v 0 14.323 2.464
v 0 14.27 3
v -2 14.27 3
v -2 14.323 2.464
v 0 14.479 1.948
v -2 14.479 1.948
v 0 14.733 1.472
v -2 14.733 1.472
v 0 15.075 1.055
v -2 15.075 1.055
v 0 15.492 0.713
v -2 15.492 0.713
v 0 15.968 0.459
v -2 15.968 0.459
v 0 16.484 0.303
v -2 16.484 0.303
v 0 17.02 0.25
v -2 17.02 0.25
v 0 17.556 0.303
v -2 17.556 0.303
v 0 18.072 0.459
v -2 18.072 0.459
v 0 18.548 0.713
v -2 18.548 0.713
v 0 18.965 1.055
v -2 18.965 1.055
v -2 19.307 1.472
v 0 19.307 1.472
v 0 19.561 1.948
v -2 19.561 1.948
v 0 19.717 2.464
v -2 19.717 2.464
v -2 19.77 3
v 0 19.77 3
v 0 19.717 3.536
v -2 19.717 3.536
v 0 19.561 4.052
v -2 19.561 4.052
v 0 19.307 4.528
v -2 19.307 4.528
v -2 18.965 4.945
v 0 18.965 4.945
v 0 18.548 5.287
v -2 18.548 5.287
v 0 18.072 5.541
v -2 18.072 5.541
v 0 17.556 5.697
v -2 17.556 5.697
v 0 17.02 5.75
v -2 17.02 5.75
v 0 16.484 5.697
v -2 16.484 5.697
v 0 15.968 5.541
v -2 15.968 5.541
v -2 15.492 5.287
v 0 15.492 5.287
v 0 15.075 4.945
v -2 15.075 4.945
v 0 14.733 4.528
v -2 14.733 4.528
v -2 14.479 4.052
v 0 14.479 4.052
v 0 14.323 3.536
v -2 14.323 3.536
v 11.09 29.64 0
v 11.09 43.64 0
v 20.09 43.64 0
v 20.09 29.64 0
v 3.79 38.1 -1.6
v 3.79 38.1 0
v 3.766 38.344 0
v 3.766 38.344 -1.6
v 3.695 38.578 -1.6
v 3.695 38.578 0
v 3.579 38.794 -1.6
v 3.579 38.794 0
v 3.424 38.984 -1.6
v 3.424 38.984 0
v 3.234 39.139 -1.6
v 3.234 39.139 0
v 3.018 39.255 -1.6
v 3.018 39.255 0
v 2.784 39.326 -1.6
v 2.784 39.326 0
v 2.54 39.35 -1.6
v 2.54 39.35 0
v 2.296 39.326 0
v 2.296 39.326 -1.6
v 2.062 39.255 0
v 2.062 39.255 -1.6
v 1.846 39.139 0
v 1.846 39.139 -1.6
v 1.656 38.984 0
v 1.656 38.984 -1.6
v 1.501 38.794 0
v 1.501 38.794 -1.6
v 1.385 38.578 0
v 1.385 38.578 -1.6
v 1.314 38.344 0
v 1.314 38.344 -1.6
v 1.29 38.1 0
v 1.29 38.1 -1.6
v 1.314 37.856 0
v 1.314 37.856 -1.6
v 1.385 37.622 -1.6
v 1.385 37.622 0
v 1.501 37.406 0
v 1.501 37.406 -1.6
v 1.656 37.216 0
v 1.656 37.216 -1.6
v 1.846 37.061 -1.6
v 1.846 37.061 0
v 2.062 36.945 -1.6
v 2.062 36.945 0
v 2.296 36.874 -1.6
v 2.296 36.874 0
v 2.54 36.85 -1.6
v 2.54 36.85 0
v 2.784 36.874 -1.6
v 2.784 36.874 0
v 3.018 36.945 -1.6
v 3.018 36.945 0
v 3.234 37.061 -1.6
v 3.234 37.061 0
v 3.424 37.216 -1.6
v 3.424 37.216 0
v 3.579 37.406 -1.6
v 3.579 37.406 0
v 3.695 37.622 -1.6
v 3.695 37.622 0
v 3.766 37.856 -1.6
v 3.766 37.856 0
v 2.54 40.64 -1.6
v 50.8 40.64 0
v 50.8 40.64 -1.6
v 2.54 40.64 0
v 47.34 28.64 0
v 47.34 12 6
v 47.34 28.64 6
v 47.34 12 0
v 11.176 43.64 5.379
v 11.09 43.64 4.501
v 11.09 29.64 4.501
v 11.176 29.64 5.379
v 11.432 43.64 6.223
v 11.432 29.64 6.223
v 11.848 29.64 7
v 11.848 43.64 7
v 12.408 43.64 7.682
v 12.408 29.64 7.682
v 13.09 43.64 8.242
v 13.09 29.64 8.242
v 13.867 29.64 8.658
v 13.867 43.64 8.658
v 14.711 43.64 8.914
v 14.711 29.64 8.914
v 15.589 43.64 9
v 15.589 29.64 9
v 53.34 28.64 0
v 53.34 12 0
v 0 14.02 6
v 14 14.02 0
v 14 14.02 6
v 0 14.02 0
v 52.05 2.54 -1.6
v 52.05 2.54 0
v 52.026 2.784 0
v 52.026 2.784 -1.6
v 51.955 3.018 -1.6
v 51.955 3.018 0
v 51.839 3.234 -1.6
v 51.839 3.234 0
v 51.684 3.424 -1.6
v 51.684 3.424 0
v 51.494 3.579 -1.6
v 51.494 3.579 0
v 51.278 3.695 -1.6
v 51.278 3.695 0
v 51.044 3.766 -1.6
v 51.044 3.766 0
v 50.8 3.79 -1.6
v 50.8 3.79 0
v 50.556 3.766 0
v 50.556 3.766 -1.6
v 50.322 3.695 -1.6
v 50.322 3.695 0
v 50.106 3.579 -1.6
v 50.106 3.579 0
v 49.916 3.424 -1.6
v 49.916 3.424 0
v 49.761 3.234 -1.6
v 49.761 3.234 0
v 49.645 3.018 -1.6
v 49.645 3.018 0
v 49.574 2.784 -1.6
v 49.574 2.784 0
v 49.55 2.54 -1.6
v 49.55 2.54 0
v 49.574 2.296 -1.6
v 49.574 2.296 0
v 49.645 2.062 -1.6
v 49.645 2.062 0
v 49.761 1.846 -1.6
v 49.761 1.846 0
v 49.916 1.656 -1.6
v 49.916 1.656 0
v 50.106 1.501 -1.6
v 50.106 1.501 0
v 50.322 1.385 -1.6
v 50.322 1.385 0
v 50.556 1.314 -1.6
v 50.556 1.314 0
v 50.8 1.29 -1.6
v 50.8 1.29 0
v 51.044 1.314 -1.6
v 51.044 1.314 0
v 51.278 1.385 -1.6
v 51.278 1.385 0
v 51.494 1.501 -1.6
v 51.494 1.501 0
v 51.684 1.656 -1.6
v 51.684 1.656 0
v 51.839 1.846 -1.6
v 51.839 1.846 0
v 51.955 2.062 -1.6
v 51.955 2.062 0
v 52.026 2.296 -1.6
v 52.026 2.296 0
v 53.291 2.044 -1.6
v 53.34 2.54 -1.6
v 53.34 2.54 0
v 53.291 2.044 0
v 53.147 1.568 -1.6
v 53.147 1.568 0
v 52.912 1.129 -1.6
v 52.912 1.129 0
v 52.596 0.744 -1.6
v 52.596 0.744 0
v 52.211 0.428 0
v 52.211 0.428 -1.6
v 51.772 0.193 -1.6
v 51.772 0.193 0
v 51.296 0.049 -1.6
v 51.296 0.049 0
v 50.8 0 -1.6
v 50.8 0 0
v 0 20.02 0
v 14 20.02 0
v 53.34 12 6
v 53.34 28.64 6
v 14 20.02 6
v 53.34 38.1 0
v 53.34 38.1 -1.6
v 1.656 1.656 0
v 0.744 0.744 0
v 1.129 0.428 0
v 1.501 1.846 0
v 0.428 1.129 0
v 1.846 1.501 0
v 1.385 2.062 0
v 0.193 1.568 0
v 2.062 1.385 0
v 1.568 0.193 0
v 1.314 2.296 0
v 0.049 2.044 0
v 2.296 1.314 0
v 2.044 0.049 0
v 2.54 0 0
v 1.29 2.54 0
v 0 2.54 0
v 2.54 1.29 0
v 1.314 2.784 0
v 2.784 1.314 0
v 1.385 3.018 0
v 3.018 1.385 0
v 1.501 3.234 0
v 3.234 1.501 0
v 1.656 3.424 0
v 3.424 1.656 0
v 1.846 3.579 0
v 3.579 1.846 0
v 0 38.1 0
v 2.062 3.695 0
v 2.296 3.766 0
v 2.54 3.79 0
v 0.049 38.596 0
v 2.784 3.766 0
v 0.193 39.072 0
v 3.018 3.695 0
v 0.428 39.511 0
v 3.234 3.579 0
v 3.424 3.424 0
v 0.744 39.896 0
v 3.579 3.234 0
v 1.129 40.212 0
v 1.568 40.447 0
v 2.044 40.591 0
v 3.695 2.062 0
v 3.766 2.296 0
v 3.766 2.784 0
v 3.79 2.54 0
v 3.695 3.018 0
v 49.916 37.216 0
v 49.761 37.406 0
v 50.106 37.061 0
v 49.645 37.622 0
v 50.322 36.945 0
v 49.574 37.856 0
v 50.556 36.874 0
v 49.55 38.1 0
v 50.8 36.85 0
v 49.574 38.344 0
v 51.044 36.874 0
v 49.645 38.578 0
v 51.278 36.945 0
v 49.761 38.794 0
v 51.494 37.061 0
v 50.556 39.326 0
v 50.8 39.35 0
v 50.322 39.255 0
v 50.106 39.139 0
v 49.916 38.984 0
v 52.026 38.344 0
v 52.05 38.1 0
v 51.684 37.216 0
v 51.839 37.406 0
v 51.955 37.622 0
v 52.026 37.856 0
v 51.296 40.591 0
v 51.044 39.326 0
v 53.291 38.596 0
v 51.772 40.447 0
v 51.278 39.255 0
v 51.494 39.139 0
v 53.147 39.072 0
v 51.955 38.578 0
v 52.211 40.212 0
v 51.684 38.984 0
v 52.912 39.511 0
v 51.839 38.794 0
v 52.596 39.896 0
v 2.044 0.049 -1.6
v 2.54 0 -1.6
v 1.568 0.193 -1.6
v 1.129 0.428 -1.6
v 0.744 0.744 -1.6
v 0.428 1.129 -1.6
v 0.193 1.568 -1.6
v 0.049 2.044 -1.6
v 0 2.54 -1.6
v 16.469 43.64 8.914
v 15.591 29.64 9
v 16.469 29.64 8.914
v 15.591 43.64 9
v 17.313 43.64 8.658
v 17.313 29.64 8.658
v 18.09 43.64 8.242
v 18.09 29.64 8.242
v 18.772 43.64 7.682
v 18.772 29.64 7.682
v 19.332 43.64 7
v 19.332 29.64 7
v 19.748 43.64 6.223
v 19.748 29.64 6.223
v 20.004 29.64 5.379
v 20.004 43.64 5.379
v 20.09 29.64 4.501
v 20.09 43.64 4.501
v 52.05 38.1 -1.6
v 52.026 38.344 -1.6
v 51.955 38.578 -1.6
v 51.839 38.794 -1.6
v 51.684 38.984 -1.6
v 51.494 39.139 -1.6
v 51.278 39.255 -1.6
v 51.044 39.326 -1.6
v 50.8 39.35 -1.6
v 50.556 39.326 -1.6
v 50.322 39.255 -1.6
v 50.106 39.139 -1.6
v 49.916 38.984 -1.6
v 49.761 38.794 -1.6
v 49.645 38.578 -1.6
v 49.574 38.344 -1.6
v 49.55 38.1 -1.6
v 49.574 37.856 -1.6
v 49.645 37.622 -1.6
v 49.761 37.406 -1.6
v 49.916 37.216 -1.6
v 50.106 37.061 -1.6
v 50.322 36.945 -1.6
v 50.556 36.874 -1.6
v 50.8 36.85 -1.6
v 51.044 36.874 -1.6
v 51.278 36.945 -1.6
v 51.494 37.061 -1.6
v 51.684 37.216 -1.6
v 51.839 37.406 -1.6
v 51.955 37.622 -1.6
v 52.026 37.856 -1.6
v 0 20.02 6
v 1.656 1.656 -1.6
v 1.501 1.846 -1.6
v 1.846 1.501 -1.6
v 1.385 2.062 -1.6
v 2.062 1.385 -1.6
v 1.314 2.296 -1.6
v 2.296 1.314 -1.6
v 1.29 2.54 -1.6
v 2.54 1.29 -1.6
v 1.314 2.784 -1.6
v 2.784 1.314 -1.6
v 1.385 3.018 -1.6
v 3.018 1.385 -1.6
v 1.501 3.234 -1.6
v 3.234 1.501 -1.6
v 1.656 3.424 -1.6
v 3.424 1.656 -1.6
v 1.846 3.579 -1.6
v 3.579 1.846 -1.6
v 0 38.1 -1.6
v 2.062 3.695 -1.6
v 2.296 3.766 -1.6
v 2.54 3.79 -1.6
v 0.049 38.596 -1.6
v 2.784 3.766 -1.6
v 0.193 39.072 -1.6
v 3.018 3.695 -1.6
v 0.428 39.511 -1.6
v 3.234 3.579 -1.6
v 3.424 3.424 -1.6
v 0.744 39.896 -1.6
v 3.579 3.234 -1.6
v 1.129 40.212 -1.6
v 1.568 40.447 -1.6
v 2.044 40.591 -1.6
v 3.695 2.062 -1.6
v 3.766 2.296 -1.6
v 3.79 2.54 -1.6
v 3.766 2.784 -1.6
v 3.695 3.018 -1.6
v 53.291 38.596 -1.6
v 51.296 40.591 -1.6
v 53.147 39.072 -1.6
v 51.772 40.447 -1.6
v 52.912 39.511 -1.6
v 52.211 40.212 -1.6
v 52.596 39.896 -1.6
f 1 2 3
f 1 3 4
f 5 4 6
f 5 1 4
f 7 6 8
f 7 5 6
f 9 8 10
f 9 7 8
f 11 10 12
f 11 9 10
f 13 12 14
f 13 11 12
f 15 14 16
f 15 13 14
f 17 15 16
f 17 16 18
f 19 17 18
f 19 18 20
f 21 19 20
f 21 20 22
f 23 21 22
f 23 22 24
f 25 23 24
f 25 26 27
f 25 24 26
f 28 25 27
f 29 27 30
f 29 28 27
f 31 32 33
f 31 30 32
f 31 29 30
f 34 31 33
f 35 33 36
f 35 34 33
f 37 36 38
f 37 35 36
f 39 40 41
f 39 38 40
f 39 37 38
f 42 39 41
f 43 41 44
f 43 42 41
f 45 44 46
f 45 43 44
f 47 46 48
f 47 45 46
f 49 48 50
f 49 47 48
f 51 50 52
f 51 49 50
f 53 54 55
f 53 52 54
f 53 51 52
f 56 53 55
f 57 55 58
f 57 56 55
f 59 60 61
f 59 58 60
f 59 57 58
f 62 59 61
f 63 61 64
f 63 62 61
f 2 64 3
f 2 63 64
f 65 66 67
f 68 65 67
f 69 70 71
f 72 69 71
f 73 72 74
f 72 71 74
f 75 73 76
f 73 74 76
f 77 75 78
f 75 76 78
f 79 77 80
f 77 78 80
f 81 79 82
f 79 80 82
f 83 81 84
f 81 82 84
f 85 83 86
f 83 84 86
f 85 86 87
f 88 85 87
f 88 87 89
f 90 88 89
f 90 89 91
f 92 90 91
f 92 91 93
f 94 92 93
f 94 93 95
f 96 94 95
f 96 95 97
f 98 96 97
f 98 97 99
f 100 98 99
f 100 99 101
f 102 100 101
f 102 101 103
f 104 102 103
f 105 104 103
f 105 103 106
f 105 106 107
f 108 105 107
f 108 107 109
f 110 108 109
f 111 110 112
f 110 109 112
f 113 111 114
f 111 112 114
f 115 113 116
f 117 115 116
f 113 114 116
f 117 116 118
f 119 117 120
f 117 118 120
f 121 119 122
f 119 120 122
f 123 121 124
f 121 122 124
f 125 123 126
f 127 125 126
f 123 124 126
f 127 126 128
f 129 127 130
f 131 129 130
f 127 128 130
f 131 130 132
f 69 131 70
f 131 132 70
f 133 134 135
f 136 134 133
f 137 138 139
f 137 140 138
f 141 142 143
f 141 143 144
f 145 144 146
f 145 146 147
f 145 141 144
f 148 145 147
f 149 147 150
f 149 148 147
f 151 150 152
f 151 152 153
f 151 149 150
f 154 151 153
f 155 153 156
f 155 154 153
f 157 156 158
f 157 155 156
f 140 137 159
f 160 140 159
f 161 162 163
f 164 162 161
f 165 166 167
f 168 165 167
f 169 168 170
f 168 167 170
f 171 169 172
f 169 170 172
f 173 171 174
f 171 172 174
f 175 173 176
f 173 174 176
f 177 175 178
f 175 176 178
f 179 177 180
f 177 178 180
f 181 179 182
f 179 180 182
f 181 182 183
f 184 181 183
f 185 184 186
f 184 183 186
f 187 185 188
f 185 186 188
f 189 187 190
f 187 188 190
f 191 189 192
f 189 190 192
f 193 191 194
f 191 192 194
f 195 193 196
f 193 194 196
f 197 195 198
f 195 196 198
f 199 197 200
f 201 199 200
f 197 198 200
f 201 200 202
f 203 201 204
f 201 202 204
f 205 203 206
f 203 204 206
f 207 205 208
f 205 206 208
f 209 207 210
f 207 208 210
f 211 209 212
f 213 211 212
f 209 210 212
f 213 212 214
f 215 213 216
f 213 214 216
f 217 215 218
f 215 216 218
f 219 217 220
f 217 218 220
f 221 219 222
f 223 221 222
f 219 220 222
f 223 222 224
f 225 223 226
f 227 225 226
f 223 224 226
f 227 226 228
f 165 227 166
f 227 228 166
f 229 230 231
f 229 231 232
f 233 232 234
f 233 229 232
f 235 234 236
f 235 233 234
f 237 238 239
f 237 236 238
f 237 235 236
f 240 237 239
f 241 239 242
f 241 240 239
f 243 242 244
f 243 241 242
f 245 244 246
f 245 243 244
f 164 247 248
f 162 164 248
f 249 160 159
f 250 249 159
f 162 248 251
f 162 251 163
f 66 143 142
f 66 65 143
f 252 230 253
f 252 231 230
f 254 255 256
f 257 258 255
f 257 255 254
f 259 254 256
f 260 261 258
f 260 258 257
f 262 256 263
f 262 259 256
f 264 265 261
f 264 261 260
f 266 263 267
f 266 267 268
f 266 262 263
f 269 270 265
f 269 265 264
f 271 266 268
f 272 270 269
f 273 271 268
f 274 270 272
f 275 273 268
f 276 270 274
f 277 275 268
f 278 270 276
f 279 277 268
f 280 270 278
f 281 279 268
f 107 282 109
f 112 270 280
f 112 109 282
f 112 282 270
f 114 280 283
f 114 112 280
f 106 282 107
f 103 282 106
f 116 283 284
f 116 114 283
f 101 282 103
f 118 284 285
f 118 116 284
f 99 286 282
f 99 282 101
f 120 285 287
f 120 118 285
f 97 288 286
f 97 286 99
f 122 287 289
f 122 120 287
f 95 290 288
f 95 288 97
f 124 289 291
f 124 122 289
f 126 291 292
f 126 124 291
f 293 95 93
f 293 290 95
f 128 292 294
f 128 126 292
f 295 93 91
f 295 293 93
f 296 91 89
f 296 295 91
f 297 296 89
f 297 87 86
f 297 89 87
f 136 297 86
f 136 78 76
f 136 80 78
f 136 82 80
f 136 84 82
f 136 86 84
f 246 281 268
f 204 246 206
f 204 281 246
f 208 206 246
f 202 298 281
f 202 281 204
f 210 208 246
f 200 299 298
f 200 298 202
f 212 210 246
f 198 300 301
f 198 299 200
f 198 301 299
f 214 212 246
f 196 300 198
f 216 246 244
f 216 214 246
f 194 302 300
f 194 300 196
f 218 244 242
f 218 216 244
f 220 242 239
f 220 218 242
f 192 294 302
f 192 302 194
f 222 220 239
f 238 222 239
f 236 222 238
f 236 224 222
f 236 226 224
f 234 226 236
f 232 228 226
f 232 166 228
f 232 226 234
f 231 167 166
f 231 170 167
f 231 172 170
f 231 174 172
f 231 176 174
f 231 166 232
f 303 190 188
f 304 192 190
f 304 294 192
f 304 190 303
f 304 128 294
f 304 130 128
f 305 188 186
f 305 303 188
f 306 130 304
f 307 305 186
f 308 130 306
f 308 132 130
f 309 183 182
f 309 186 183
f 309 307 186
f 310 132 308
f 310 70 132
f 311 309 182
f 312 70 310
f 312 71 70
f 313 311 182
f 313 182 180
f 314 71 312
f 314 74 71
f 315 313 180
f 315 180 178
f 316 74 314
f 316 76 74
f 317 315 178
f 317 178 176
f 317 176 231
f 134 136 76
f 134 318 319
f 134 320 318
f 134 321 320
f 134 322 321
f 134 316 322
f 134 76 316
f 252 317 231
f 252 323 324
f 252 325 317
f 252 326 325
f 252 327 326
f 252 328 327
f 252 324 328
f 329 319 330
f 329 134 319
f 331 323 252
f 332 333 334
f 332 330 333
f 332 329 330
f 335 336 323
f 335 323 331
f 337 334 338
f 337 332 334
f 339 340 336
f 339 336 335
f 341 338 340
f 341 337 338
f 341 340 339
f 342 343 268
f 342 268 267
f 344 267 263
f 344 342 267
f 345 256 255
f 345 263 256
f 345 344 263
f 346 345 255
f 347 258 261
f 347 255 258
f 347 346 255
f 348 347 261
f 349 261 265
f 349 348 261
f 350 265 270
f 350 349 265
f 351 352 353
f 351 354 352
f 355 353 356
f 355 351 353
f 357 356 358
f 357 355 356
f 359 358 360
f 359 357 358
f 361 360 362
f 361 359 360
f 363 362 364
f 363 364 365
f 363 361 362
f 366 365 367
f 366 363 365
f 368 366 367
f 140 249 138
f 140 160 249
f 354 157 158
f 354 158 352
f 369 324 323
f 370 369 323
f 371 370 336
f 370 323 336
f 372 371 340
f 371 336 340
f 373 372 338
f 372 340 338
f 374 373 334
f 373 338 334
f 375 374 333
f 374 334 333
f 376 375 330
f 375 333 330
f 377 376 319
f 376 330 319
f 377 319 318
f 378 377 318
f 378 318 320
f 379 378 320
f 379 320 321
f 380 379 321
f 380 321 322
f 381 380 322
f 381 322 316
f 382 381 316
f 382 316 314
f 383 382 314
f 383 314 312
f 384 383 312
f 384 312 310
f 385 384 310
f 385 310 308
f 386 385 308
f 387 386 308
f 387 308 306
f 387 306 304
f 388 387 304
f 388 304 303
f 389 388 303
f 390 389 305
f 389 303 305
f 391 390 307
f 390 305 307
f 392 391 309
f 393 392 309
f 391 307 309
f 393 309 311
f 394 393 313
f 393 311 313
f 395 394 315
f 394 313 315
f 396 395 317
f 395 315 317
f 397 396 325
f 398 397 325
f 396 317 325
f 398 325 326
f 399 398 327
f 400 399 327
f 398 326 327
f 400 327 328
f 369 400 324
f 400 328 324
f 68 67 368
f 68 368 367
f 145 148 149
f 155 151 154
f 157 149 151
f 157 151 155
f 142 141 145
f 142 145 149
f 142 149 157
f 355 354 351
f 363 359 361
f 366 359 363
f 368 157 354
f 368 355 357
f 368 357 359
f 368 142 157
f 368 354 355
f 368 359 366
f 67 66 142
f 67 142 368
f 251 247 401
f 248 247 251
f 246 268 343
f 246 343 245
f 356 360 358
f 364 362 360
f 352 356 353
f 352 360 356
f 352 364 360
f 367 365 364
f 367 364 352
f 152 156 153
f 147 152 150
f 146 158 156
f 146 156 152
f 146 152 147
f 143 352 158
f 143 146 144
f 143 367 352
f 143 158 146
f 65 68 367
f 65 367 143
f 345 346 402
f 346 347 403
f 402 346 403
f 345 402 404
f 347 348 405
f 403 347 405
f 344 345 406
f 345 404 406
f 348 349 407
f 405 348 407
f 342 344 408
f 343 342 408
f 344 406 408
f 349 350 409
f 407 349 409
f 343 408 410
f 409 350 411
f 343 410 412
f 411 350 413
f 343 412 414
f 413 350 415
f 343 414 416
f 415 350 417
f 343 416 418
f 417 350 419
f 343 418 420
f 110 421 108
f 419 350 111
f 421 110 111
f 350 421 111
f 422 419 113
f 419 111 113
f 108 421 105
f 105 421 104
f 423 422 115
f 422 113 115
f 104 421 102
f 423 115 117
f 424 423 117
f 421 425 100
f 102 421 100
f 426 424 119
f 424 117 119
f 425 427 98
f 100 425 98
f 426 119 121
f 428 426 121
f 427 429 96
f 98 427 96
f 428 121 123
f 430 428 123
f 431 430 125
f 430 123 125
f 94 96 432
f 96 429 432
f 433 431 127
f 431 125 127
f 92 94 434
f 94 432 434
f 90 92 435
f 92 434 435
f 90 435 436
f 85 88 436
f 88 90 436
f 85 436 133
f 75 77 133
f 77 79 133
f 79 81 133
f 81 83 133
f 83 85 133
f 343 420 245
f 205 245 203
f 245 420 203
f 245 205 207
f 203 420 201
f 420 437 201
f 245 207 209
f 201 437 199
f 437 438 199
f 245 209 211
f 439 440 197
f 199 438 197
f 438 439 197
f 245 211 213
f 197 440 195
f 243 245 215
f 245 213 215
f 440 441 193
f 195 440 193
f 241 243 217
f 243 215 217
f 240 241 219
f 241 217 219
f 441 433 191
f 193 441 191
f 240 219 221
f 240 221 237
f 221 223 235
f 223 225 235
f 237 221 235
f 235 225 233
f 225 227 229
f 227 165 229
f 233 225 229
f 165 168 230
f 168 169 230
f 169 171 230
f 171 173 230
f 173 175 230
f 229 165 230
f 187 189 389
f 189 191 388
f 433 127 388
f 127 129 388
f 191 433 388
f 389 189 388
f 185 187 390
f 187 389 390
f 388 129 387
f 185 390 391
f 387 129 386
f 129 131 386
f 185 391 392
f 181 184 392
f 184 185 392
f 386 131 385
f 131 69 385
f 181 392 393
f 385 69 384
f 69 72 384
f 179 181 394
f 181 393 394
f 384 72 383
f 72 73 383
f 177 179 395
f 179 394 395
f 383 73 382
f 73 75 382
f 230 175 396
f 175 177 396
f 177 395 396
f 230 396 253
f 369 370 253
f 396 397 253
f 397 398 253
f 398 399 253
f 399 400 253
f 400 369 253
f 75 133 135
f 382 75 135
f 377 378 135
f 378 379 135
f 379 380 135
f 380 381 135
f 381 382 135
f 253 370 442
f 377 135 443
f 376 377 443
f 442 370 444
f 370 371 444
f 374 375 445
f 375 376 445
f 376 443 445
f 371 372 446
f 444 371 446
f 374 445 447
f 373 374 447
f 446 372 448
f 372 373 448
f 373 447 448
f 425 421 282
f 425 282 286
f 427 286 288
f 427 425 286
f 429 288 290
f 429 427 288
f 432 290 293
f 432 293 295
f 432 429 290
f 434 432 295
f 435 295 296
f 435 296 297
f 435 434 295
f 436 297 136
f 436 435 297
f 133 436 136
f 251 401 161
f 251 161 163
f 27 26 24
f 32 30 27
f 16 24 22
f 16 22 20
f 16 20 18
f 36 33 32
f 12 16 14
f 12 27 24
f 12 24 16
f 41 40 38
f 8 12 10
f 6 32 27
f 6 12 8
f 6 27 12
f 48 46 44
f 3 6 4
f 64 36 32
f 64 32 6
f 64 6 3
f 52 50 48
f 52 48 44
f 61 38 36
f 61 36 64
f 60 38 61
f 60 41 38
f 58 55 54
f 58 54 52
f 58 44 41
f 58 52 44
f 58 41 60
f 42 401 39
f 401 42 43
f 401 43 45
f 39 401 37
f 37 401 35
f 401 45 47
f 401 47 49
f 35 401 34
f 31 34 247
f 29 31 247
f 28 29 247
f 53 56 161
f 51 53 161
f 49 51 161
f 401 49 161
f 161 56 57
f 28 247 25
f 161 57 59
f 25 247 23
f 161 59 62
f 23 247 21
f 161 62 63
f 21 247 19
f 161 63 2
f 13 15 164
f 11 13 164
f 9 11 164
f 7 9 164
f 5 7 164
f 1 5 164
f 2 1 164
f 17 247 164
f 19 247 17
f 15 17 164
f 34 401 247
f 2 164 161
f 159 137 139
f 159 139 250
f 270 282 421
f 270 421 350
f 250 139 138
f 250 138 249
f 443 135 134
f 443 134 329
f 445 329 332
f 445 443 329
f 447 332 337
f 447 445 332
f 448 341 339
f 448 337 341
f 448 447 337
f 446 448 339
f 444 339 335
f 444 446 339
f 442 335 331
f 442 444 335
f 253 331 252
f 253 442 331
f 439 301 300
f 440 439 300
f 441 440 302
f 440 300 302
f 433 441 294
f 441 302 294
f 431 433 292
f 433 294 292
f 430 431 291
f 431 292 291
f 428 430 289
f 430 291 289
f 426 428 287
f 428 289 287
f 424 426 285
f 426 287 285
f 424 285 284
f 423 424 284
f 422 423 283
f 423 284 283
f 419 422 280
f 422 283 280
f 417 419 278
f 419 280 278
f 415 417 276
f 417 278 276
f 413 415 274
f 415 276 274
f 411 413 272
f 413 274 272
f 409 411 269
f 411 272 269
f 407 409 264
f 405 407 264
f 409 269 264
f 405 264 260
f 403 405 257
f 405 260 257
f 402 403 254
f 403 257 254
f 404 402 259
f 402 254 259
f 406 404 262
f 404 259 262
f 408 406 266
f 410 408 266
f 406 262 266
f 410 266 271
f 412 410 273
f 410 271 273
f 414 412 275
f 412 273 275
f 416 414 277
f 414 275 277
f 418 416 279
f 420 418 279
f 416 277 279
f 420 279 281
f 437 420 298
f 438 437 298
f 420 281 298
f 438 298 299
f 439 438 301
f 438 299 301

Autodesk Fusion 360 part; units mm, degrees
sketch "Sketch1" plane through (0, 0, 0) normal (0, 0, 1) x (1, 0, 0)
  line L0 (0, 0) -> (53.34, 0)
  line L1 (53.34, 0) -> (53.34, 40.64)
  line L2 (53.34, 40.64) -> (0, 40.64)
  line L3 (0, 40.64) -> (0, 0)
  circle A0 centre (2.54, 2.54) radius 1.25
  line L4 (26.67, 40.64) -> (26.67, 0) construction
  line L5 (53.34, 20.32) -> (0, 20.32) construction
  circle A1 centre (50.8, 2.54) radius 1.25
  circle A2 centre (2.54, 38.1) radius 1.25
  circle A3 centre (50.8, 38.1) radius 1.25
  line L6 (0, 20.02) -> (14, 20.02)
  line L7 (14, 20.02) -> (14, 14.02)
  line L8 (14, 14.02) -> (0, 14.02)
  line L9 (0, 14.02) -> (0, 20.02)
  line L10 (14, 17.02) -> (0, 17.02) construction
  line L11 (11.09, 43.64) -> (20.09, 43.64)
  line L12 (20.09, 43.64) -> (20.09, 29.64)
  line L13 (20.09, 29.64) -> (11.09, 29.64)
  line L14 (11.09, 29.64) -> (11.09, 43.64)
  line L15 (15.59, 43.64) -> (15.59, 29.64) construction
  line L16 (53.34, 12) -> (47.34, 12)
  line L17 (47.34, 12) -> (47.34, 28.64)
  line L18 (47.34, 28.64) -> (53.34, 28.64)
  line L19 (53.34, 28.64) -> (53.34, 12)
  line L20 (53.34, 12) -> (47.34, 28.64) construction
  line L21 (47.34, 12) -> (53.34, 28.64) construction
  point P0 (50.34, 20.32)
  dimension "d1" = 53.34
  dimension "d2" = 40.64
  dimension "d3" = 2.5
  dimension "d4" = 2.54
  dimension "d5" = 2.54
  dimension "d9" = 14
  dimension "d10" = 6
  dimension "d11" = 17.02
  dimension "d12" = 9
  dimension "d13" = 14
  dimension "d14" = 15.59
  dimension "d15" = 3
  dimension "d24" = 16.64
  dimension "d25" = 6
extrude "Extrude1" add sketch "Sketch1" against normal blind 1.6 contours L0 L1 L2 L3 L6 L7 L8 L12 L13 L14 L16 L17 L18 | L3 L6 L7 L8 L9 | L1 L16 L17 L18 L19 | L2 L12 L13 L14 makes body 1
fillet "Fillet1" radius 2.54 4 edges at (53.34, 0, -0.8) (53.34, 40.64, -0.8) (0, 40.64, -0.8) (0, 0, -0.8) on bodies 1
extrude "Extrude2" add sketch "Sketch1" along normal blind 6 separate body contours L3 L6 L7 L8 L9 makes body 2
sketch "Sketch2" plane through (0, 0, 0) normal (-1, 0, 0) x (0, -1, 0)
  line L0 (-20.02, 0) -> (-14.02, 0)
  line L1 (-14.02, 0) -> (-14.02, 6)
  line L2 (-14.02, 6) -> (-20.02, 6)
  line L3 (-20.02, 6) -> (-20.02, 0)
  line L4 (-17.02, 6) -> (-17.02, 0) construction
  line L5 (-20.02, 3) -> (-14.02, 3) construction
  circle A0 centre (-17.02, 3) radius 2.75
  point P0 (-17.02, 0)
  dimension "d18" = 5.5
extrude "Extrude3" add sketch "Sketch2" along normal blind 2 contours A0 bodies 2
extrude "Extrude4" add sketch "Sketch1" along normal blind 9 separate body contours L2 L11 L12 L14 | L2 L12 L13 L14 makes body 3
fillet "Fillet2" radius 4.5 2 edges at (11.09, 36.64, 9) (20.09, 36.64, 9) on bodies 3
extrude "Extrude5" add sketch "Sketch1" along normal blind 6 separate body contours L1 L16 L17 L18 L19 makes body 4
